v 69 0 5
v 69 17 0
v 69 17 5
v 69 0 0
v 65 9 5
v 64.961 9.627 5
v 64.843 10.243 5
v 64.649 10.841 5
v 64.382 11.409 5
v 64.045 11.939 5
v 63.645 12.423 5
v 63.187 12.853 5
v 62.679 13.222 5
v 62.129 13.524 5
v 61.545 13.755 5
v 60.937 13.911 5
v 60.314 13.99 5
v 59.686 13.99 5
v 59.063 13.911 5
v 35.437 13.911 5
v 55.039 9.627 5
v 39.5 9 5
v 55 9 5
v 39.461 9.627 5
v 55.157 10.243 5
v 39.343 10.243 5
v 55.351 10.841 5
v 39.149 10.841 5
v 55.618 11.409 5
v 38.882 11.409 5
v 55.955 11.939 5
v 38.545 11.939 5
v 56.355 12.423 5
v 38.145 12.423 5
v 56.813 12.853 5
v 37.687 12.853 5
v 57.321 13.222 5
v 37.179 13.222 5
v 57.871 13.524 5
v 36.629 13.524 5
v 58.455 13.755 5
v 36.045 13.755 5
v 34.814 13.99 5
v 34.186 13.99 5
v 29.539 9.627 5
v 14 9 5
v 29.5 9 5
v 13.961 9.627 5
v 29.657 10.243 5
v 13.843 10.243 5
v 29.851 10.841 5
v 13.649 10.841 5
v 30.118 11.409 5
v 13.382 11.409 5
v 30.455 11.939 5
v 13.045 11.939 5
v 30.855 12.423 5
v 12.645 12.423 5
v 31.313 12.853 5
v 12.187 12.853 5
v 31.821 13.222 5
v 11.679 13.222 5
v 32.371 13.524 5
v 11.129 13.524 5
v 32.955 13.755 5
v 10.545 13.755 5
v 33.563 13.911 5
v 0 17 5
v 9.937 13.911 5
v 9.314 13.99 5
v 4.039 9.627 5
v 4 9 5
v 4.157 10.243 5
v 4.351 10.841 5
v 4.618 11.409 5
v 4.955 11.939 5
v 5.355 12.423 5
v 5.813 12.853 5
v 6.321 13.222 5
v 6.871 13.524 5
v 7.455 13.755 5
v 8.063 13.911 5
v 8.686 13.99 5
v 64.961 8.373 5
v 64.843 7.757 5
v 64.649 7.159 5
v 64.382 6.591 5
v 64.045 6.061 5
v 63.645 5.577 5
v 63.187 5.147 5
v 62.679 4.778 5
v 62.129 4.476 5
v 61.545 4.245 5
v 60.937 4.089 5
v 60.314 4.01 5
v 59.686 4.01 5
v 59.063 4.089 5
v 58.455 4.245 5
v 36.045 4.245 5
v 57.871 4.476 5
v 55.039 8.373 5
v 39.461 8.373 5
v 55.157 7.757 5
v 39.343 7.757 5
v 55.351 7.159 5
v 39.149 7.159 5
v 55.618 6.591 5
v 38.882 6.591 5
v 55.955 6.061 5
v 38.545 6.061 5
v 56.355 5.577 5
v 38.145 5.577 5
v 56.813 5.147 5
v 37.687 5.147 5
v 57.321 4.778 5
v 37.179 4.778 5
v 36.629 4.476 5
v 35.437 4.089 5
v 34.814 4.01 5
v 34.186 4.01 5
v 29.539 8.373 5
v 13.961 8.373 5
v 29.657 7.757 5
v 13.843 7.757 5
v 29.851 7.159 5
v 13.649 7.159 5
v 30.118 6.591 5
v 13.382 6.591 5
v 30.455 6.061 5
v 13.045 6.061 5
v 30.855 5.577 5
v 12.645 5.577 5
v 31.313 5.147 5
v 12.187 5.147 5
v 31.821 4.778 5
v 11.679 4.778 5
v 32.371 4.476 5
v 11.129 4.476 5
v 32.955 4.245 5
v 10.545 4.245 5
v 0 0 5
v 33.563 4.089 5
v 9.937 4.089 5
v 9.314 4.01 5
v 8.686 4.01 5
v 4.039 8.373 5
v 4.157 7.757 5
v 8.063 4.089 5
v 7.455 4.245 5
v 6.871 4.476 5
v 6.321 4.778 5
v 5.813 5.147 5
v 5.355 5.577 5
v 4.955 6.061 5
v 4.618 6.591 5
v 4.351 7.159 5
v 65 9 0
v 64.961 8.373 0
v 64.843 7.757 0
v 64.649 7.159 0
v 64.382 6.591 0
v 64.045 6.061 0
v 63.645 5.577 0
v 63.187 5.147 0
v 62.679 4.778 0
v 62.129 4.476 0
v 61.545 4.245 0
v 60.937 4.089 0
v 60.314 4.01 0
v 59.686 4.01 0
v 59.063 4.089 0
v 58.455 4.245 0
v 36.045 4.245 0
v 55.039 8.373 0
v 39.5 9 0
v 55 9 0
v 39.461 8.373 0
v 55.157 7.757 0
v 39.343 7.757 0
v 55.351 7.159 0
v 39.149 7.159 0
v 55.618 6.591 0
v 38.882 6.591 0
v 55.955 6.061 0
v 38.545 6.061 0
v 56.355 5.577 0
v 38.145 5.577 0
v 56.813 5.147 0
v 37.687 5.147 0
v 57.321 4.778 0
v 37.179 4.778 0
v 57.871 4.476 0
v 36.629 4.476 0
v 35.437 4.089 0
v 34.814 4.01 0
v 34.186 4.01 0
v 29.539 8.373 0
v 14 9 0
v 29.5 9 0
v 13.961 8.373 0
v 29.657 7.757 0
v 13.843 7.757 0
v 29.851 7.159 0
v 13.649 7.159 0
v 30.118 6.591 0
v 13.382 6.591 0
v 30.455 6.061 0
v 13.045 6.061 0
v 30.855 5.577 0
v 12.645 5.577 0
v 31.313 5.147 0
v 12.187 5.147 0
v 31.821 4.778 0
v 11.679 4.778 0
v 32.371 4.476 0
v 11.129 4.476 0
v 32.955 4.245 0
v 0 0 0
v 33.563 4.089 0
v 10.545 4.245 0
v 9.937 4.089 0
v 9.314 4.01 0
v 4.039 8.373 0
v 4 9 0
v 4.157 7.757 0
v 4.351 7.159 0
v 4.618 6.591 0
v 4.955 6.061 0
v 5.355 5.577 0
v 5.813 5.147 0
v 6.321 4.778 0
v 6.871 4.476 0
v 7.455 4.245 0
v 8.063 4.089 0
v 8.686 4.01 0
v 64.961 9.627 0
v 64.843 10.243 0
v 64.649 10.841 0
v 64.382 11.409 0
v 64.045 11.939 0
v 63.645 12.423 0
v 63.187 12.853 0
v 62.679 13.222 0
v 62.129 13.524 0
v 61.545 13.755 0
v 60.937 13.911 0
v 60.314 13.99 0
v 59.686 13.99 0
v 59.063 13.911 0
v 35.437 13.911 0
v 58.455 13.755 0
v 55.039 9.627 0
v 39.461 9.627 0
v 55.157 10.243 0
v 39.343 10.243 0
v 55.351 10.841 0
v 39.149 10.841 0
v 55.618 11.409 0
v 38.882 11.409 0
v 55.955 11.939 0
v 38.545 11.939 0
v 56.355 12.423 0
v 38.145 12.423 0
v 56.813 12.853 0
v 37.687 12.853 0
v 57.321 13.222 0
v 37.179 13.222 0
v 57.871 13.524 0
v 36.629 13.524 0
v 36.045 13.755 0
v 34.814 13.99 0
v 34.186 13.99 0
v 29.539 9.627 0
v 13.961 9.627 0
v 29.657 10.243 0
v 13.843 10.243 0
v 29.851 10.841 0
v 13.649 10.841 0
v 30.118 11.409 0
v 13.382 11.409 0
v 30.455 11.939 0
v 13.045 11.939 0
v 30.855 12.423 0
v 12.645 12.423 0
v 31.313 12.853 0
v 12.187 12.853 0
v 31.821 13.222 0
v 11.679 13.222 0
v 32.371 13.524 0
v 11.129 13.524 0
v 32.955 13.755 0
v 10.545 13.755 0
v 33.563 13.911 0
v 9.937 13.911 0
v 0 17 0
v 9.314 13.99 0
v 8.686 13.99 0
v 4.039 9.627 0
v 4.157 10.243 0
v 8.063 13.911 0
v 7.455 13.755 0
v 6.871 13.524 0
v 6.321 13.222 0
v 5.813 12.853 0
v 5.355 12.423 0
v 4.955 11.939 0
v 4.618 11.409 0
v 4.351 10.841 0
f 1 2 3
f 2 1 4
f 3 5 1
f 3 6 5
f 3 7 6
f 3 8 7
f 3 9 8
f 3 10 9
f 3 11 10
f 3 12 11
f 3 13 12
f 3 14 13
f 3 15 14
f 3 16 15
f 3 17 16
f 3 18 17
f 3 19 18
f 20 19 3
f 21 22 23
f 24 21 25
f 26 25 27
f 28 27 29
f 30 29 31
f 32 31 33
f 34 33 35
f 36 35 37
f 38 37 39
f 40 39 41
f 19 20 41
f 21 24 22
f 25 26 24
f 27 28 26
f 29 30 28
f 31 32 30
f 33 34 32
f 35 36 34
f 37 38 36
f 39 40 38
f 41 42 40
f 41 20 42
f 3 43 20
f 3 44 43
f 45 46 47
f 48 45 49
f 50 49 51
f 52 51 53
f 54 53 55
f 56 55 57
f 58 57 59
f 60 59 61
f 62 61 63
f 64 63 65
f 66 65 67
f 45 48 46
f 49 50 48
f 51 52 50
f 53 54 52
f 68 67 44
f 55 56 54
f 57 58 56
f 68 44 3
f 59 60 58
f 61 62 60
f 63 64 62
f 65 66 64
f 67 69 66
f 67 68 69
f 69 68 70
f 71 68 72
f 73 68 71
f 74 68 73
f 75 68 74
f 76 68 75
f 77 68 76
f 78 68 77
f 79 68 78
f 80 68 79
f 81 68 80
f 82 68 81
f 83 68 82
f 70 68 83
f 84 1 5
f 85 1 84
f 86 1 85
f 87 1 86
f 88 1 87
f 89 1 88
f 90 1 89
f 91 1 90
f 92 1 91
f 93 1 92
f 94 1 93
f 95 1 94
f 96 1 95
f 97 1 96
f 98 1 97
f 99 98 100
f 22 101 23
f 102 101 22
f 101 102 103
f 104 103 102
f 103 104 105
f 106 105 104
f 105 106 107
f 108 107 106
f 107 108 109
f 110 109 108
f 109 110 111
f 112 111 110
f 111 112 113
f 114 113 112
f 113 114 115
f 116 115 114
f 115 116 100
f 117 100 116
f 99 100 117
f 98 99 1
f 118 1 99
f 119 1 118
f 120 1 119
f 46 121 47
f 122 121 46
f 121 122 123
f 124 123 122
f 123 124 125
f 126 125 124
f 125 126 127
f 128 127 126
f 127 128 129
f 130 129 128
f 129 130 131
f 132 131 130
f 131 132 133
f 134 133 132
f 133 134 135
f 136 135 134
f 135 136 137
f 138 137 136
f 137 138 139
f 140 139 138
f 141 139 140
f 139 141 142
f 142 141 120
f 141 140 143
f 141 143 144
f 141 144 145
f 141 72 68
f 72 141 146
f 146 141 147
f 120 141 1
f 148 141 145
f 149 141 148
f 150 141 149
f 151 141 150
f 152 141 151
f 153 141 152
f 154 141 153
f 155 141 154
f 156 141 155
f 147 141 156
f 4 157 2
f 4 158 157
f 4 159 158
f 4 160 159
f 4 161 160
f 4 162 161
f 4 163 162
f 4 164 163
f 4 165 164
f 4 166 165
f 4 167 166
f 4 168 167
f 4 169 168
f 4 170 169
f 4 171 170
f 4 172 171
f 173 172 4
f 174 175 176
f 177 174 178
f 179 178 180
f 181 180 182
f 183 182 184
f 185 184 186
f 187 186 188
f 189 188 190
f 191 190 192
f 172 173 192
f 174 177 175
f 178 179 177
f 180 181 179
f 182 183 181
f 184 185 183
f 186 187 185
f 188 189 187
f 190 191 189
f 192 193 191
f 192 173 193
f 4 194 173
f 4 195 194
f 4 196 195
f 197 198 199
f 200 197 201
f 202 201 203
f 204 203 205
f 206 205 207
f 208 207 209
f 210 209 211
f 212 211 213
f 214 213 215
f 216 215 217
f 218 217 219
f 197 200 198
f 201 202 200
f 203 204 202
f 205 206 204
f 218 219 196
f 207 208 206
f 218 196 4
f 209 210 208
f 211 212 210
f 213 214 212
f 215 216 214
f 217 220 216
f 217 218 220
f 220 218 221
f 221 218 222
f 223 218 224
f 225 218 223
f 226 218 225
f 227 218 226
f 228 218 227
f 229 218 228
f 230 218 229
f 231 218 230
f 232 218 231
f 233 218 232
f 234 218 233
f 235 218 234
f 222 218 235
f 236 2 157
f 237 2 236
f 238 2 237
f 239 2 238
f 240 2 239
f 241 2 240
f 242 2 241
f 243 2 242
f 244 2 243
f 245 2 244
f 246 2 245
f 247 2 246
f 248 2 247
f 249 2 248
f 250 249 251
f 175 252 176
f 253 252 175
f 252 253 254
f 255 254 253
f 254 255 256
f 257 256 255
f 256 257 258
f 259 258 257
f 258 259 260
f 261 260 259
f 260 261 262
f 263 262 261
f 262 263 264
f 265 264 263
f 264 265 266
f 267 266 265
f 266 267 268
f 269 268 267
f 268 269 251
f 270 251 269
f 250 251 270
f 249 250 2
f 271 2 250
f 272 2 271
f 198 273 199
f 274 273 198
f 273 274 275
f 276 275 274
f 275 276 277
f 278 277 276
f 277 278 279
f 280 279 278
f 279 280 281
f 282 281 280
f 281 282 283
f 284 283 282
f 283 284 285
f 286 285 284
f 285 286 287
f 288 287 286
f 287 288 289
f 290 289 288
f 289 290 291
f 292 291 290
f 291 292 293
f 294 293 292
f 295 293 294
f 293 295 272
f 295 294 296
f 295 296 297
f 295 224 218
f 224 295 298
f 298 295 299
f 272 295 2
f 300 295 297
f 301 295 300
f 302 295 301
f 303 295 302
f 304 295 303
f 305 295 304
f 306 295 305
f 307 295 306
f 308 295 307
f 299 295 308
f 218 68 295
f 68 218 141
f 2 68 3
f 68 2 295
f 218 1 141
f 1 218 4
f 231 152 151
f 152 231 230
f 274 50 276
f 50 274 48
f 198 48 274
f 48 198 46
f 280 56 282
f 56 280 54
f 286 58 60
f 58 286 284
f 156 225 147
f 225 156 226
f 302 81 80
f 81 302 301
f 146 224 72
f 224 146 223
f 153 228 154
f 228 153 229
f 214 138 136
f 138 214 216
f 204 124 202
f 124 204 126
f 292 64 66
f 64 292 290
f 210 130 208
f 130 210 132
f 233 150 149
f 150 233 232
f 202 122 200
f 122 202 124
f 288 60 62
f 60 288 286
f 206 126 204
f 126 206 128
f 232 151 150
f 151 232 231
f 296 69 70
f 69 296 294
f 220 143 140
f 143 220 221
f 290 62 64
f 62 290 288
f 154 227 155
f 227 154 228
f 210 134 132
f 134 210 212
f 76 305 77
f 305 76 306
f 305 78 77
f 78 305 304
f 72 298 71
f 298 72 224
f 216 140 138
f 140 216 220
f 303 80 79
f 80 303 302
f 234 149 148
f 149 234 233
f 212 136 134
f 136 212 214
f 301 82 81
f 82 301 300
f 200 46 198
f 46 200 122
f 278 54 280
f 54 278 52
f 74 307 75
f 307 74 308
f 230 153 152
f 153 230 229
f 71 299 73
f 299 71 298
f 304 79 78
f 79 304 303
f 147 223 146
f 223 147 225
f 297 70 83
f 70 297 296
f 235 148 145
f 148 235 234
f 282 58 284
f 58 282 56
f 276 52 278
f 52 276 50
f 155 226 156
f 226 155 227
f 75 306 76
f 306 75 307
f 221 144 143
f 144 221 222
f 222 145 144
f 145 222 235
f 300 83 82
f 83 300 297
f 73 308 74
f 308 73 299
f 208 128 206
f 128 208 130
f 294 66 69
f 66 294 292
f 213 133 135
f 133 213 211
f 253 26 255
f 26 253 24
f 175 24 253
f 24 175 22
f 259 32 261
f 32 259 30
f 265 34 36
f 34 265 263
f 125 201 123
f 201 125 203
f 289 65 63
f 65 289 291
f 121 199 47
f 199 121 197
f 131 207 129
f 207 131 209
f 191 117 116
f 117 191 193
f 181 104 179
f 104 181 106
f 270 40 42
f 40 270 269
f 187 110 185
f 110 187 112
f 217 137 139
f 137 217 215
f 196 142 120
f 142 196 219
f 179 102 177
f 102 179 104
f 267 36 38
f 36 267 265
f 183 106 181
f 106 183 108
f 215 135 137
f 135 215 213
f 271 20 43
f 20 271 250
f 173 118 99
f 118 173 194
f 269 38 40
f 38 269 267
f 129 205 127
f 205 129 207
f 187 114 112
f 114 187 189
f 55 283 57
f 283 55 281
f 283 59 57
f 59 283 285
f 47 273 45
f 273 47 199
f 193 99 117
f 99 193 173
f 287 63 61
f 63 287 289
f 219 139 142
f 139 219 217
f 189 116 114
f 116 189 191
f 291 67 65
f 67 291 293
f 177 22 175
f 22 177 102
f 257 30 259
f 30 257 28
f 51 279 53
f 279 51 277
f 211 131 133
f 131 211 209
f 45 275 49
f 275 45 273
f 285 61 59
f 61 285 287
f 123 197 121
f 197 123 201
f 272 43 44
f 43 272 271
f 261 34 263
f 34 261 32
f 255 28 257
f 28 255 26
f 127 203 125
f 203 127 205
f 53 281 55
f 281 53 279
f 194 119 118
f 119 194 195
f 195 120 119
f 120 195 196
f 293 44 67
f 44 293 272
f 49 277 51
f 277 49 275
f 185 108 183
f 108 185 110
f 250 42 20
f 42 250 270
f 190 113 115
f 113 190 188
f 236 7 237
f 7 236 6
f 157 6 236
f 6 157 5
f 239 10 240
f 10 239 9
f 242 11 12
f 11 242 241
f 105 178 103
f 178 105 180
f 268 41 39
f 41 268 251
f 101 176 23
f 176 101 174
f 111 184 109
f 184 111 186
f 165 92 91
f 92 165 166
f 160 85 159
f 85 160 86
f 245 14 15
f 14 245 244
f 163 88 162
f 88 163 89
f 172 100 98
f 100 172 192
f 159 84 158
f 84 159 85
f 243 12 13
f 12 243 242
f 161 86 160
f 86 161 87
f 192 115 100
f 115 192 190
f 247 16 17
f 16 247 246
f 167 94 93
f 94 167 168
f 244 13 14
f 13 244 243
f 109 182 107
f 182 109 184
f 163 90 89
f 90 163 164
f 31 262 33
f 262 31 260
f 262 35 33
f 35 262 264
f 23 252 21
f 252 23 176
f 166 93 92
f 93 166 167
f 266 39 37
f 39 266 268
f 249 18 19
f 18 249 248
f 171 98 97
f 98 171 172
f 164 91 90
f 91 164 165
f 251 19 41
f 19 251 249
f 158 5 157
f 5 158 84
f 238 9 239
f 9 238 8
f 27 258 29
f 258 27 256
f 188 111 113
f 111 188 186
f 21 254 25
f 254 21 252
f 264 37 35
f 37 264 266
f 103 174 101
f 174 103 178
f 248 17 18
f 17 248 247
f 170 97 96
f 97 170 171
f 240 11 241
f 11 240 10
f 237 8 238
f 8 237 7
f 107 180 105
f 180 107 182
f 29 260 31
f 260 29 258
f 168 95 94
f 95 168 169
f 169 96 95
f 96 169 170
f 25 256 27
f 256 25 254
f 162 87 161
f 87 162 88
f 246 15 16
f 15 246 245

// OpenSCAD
$fn=50;

//cap();
//translate([0,50,0]) displaySupport();
led_bar();

module led_bar() {
    difference() {
        cube([69,17,5]);
        translate([9,9,-1]) cylinder(h=7, d=10);
        translate([34.5,9,-1]) cylinder(h=7, d=10);
        translate([60,9,-1]) cylinder(h=7, d=10);
    }
}

module cap() {
    difference() {
        union() {
            cylinder(h=2, d=36.8);
            cylinder(h=4, d=34);
        }
        translate([0,0,-1]) cylinder(h=6, d=20);
    }
}

module displaySupport() {
    translate([0,0,7]) rotate([180,0,0])difference() {
    cube([69,20,7]);
    translate([5,1.75,-1]) cube([59,16.5,4]);
    translate([55,-1,5]) cube([10,22,3]);
    }
}
